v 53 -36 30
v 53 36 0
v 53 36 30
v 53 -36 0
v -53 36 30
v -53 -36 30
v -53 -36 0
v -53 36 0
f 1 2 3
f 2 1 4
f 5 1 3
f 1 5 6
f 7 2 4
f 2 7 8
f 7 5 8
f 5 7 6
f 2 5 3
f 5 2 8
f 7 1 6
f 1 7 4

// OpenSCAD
// Bench rack for 1.5 mL microcentrifuge tubes
// Print orientation: base on XY plane, holes open at the top

// ---- Block dimensions ----
block_len   = 106;   // length along X
block_wid   = 72;    // width along Y
block_ht    = 30;    // height along Z

// ---- Hole parameters ----
hole_count  = 24;    // total number of holes (4 rows x 6 columns)
hole_d      = 11.2;  // hole diameter
hole_depth  = 25;    // hole depth from top face
pitch       = 16;    // centre-to-centre spacing in X and Y
floor_t     = block_ht - hole_depth; // solid floor thickness (5 mm)

// ---- Cutting overlap ----
eps         = 0.5;   // extension past faces to avoid coplanar surfaces

$fn = 96;

difference() {
    // Main block, centred in X and Y, resting on z = 0
    translate([-block_len / 2, -block_wid / 2, 0])
        cube([block_len, block_wid, block_ht]);

    // Hole grid, centred on the block
    for (i = [0 : hole_count - 1]) {
        for (j = [0 : (hole_count - 1) / hole_count]) {
            x = (i - (hole_count - 1) / 2) * pitch;
            y = (j - (hole_count - 1) / 2) * pitch;
            translate([x, y, floor_t])
                cylinder(d = hole_d, h = hole_depth + eps);
        }
    }
}
